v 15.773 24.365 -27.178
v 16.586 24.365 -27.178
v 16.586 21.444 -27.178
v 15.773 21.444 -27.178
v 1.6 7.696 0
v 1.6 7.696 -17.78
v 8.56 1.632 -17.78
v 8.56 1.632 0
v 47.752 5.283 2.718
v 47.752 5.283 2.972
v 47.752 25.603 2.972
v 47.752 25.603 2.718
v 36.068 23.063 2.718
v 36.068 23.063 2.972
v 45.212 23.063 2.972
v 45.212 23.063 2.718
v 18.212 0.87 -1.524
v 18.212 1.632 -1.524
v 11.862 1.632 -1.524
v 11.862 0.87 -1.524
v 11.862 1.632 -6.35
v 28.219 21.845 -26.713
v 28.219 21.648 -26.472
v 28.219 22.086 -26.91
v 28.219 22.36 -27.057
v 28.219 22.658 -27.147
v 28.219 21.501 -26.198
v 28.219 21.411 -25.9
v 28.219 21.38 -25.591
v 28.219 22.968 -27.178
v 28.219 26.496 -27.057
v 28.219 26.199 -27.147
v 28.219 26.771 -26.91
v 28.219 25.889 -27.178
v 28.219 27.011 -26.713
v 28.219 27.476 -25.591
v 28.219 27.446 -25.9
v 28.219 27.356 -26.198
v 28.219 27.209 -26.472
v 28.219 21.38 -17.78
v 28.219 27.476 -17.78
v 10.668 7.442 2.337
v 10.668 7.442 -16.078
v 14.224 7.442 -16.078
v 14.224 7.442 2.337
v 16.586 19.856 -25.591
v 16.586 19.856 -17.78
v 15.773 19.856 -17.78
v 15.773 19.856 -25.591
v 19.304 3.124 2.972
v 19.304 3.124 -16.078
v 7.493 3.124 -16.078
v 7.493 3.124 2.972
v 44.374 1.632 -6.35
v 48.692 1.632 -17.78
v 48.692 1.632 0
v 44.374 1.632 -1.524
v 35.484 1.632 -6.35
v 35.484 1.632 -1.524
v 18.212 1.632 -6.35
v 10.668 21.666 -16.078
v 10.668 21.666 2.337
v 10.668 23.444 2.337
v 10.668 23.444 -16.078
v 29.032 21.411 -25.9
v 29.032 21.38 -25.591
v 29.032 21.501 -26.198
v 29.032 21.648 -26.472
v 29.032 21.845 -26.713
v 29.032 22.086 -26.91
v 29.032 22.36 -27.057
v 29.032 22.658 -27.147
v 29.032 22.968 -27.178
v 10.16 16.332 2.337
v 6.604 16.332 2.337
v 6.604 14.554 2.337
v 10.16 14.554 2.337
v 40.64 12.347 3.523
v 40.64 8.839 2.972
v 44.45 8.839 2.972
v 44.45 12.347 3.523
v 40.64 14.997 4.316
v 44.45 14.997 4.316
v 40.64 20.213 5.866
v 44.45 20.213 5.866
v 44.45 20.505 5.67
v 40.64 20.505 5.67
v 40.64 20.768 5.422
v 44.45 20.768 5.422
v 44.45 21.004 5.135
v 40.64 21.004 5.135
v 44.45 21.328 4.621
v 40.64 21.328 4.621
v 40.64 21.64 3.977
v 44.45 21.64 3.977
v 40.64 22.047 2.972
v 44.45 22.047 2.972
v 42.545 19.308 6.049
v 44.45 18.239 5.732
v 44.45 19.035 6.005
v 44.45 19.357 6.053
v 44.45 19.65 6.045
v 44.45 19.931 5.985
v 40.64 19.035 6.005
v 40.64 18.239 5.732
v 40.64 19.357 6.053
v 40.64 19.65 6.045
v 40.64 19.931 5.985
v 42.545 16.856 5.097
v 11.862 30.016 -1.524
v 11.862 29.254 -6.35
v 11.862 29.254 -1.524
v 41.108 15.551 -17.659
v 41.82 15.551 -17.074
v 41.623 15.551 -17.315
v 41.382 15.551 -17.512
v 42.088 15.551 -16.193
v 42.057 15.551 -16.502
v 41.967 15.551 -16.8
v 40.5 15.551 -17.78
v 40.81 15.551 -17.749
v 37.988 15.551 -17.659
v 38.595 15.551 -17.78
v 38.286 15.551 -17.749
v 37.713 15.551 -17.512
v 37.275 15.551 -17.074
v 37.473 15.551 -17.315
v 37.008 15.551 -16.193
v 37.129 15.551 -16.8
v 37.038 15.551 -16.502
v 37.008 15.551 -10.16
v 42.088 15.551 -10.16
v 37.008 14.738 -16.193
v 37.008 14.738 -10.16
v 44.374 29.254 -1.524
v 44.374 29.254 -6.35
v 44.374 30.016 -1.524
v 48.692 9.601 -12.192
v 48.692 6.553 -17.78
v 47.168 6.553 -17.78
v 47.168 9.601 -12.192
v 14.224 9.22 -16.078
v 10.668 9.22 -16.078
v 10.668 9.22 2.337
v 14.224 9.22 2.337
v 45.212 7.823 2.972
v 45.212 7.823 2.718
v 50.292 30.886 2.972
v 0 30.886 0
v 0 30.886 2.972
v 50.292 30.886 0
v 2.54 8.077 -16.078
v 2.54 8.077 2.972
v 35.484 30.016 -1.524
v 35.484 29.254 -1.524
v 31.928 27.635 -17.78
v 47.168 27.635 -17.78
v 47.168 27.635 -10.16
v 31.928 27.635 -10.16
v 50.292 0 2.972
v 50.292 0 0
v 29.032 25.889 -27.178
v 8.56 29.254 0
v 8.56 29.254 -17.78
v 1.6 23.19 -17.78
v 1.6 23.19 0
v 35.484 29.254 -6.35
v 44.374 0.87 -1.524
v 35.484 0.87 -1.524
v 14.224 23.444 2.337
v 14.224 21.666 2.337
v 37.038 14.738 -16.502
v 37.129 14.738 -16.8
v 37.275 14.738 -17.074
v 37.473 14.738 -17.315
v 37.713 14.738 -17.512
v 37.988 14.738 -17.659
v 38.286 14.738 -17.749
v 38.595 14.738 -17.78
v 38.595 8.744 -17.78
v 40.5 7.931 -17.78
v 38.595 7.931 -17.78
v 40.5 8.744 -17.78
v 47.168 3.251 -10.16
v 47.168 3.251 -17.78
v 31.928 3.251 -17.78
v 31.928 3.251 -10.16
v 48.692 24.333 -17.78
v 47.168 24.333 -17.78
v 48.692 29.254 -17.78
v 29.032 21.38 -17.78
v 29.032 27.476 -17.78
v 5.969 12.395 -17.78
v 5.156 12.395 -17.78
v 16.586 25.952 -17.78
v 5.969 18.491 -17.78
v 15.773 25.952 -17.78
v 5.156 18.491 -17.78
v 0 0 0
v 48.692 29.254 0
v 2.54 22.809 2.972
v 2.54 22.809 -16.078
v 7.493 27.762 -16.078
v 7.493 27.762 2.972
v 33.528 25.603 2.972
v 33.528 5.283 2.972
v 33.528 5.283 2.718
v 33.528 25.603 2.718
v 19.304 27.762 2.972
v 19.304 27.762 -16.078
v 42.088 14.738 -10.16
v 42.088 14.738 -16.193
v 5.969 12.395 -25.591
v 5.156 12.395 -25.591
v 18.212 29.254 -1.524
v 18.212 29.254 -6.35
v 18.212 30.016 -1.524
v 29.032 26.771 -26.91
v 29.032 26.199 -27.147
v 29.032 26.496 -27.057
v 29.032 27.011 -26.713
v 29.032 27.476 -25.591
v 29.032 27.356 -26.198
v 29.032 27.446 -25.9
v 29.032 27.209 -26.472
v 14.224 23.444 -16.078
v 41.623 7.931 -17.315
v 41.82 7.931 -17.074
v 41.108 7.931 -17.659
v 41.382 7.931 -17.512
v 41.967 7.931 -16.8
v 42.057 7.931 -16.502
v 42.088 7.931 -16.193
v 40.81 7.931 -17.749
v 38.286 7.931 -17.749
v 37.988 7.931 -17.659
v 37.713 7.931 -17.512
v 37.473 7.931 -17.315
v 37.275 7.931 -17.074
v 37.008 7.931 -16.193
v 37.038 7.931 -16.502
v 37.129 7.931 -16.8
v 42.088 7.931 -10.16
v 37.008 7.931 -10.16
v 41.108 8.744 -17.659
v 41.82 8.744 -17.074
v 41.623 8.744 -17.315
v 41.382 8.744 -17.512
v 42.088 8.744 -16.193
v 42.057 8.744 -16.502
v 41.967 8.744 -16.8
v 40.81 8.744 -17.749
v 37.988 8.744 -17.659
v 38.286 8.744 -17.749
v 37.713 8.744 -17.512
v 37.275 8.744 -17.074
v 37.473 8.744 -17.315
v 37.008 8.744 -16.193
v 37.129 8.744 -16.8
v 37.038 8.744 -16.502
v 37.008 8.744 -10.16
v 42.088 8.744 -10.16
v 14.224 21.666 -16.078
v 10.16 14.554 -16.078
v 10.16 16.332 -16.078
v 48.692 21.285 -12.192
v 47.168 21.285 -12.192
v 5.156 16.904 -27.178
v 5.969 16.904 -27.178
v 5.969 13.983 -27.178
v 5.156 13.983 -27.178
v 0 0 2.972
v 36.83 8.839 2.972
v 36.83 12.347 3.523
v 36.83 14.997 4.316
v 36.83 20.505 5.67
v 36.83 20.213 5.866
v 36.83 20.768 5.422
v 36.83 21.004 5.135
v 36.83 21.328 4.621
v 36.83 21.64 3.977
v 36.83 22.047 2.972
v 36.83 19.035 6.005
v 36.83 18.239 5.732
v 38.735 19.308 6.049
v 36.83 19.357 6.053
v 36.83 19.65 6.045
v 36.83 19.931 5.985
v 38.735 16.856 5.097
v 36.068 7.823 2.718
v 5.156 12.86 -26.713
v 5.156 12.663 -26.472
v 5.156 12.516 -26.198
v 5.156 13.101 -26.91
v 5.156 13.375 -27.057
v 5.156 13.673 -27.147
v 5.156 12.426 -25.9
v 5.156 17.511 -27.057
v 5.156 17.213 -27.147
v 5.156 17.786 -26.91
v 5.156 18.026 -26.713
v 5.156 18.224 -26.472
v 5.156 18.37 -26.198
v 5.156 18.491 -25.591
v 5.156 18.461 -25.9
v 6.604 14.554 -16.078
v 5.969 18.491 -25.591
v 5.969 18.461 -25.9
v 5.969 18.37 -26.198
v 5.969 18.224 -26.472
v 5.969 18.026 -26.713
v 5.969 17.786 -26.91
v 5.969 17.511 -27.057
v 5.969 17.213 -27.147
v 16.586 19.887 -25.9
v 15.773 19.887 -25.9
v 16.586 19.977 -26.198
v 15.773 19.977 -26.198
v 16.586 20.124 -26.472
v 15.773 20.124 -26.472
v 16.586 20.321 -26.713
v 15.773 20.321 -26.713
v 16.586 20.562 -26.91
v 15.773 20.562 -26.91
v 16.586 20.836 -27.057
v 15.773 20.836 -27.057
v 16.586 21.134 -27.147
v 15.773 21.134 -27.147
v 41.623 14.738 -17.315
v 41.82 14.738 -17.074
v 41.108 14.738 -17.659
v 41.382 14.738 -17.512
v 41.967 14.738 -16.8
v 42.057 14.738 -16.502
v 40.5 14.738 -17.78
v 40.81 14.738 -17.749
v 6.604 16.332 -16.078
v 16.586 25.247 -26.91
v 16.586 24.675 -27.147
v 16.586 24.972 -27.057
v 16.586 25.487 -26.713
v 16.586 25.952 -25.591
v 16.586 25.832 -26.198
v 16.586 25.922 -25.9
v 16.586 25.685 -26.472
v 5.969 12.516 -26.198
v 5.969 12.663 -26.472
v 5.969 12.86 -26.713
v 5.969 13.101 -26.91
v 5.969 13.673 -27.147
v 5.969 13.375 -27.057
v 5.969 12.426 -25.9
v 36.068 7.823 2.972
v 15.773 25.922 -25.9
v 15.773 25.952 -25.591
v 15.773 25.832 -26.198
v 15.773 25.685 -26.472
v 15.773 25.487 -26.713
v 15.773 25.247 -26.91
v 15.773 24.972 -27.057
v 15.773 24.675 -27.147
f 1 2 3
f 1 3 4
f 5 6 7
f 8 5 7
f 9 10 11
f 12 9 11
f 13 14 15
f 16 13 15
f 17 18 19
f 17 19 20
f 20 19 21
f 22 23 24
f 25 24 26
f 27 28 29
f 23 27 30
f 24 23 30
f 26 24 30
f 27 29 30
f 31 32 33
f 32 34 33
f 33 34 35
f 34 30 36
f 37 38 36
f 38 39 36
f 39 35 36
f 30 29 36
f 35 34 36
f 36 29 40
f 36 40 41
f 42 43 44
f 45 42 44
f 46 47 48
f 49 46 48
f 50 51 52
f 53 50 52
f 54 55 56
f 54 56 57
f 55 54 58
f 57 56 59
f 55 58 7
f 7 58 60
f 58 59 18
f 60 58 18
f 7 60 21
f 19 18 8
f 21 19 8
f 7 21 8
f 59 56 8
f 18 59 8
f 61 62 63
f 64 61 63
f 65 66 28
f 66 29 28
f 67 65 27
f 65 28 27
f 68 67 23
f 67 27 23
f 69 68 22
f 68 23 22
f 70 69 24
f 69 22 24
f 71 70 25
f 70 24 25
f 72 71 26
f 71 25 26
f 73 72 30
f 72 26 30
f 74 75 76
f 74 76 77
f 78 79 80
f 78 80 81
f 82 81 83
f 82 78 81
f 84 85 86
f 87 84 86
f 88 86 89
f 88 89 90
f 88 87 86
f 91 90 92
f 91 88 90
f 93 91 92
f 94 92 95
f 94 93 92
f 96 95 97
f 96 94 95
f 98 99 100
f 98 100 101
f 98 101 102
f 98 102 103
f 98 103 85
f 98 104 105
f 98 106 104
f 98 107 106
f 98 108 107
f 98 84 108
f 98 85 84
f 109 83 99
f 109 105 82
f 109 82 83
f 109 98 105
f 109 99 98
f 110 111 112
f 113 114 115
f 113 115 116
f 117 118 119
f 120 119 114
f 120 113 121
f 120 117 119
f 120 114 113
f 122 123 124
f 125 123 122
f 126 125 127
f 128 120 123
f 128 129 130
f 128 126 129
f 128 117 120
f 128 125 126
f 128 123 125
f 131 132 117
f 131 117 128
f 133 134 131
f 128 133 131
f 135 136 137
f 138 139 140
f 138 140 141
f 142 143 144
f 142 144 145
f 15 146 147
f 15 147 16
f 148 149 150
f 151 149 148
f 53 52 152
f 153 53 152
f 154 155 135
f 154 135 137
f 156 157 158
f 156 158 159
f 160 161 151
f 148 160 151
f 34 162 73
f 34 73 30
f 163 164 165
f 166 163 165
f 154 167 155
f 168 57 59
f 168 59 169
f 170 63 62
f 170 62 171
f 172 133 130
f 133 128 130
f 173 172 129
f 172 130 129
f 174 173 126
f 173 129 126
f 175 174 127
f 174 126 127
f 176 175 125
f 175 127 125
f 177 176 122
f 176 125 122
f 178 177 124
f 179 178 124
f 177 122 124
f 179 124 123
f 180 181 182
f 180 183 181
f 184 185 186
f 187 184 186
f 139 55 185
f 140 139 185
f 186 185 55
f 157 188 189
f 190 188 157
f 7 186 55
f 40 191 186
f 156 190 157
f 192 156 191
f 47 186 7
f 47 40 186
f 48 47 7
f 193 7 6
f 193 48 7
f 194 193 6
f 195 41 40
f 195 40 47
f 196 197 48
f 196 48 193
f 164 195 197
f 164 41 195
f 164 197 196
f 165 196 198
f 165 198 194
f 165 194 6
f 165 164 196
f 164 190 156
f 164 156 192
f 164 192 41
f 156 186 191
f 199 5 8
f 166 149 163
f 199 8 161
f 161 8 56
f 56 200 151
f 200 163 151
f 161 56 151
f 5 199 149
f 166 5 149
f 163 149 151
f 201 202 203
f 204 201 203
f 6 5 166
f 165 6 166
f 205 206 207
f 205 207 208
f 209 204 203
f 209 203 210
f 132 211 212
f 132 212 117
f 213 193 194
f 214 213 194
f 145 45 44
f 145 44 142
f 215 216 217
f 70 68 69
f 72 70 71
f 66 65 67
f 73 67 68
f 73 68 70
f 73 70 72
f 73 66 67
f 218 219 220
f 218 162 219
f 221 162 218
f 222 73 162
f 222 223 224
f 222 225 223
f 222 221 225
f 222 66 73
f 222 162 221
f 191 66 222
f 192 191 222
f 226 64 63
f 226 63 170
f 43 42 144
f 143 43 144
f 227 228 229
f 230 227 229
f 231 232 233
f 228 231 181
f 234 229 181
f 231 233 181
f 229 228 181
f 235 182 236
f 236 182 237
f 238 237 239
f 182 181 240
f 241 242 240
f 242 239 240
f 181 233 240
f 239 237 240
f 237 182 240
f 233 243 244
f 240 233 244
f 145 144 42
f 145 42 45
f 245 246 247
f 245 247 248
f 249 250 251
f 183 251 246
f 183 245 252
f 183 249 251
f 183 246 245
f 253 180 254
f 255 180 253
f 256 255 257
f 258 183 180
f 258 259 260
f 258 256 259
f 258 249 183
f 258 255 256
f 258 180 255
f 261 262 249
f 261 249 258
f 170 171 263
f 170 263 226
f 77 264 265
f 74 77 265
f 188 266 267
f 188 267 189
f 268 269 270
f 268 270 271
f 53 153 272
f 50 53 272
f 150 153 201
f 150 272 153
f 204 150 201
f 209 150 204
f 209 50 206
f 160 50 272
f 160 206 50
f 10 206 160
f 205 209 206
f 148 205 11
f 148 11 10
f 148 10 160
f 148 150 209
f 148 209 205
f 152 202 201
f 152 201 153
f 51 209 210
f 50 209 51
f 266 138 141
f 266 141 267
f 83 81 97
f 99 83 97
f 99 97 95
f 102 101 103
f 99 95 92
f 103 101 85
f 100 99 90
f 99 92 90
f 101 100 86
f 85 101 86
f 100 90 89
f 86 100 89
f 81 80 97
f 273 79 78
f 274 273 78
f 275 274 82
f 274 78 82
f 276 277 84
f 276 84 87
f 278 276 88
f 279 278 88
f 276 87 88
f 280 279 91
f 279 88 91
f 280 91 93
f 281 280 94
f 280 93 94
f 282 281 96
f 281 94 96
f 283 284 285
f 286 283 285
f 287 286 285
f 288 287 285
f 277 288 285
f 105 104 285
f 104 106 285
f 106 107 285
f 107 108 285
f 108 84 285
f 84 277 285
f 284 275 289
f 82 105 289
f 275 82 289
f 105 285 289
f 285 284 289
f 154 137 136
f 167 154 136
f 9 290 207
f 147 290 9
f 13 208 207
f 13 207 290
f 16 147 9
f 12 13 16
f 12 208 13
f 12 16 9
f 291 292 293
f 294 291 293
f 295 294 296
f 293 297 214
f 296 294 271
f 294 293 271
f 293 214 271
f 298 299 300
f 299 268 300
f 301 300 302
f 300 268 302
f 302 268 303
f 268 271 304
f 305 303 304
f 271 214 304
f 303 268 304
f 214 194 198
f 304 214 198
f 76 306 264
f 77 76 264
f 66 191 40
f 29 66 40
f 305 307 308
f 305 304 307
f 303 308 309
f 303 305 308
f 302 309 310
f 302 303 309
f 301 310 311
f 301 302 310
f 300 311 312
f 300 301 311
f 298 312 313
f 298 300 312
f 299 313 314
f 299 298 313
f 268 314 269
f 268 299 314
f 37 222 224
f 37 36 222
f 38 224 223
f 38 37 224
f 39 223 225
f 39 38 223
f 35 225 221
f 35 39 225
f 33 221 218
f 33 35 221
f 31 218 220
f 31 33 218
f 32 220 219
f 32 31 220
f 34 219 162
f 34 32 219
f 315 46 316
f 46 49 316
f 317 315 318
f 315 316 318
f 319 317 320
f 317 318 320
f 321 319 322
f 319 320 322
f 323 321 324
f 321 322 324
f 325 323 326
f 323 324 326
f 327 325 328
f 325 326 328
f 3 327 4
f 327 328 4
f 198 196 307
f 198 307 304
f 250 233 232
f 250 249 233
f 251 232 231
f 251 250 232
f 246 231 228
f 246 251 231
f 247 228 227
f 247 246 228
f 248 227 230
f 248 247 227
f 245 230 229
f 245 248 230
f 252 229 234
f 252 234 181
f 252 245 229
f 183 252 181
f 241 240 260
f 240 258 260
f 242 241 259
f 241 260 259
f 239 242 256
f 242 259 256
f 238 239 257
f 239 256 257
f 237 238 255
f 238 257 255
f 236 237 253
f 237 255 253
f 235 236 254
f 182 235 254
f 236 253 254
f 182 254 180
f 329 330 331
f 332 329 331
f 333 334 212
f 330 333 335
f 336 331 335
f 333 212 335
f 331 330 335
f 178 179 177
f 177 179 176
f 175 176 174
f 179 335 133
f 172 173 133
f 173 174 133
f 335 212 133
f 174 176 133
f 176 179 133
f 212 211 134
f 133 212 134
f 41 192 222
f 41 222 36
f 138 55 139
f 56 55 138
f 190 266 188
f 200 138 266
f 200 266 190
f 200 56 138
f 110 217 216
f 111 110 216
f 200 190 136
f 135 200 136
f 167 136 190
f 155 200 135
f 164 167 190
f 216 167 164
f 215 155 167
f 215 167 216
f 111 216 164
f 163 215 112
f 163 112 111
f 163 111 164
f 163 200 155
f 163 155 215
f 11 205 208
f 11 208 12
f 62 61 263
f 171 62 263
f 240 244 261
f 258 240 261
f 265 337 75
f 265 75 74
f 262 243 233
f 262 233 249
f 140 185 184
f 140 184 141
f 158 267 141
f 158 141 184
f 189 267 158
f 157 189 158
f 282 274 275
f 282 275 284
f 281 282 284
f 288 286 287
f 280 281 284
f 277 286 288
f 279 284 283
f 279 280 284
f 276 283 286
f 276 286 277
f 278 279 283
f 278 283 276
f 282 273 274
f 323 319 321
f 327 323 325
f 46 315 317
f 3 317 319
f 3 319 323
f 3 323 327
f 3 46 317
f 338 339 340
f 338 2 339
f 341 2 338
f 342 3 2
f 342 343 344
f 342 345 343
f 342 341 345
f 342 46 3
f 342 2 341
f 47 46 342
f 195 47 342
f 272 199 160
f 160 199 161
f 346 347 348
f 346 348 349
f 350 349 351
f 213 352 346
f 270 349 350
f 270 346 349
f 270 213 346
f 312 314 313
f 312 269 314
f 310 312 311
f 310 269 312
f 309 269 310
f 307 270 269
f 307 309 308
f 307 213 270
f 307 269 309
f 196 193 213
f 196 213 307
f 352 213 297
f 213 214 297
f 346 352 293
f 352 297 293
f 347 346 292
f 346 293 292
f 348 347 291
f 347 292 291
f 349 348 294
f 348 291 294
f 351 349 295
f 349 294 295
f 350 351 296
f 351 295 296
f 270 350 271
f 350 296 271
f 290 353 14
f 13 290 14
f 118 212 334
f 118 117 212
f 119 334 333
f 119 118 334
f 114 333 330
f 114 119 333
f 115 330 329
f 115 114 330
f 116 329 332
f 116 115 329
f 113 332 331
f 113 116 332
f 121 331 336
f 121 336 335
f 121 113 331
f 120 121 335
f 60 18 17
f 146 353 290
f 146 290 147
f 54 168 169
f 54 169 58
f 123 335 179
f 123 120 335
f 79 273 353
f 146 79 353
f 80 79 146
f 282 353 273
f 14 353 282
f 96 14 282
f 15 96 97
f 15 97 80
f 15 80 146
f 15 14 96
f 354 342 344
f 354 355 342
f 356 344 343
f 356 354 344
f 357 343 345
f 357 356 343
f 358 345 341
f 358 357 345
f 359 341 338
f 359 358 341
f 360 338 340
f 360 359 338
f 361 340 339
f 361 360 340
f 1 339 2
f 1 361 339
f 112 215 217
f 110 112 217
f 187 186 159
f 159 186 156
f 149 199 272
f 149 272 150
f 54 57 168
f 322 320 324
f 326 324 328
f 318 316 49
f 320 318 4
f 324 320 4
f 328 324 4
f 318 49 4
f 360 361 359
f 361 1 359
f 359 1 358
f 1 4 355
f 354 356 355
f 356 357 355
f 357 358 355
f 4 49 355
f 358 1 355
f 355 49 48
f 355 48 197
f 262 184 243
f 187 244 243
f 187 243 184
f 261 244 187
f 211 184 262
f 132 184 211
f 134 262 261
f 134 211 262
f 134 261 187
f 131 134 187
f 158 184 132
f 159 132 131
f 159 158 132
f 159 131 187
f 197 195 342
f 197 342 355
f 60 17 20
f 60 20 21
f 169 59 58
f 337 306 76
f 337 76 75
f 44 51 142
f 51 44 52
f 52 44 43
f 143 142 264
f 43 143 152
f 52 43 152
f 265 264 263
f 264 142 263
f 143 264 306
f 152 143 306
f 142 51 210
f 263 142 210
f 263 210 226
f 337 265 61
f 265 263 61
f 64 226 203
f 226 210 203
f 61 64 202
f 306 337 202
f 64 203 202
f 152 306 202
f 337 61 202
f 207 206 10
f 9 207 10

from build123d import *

# Parameters (mm, degrees)
SKETCH1_W           = 50.292
SKETCH1_H           = 30.8864
BOSS_EXTRUDE1_DEPTH = 2.9718
SKETCH2_W           = 47.0916
SKETCH2_H           = 27.6225
BOSS_EXTRUDE2_DEPTH = 17.78
CUT_EXTRUDE1_DEPTH  = 17.78
SKETCH4_W           = 15.24
SKETCH4_H           = 24.384
CUT_EXTRUDE2_DEPTH  = 7.62
CUT_EXTRUDE3_REACH  = 62.341
SKETCH6_W           = 0.8128
SKETCH6_H           = 6.096
BOSS_EXTRUDE3_DEPTH = 9.398
SKETCH7_W           = 5.08
SKETCH7_H           = 0.8128
BOSS_EXTRUDE4_DEPTH = 7.62
FILLET1_R           = 1.5875
CUT_EXTRUDE4_DEPTH  = 19.05
SKETCH9_W           = 3.556
SKETCH9_H           = 1.778
BOSS_EXTRUDE5_DEPTH = 18.415
SKETCH10_W          = 14.224
SKETCH10_H          = 20.32
SKETCH10_W_2        = 9.144
SKETCH10_H_2        = 15.24
CUT_EXTRUDE5_DEPTH  = 0.254
BOSS_EXTRUDE6_START = -9.652
BOSS_EXTRUDE6_DEPTH = 3.81
BOSS_EXTRUDE7_START = -4.318
BOSS_EXTRUDE7_DEPTH = 8.89
BOSS_EXTRUDE8_START = -30.48
BOSS_EXTRUDE8_DEPTH = 6.35


with BuildPart() as part:
    # Sketch1 → Boss-Extrude1 (new body)
    with BuildSketch(Plane.XY):
        with Locations((25.146, 15.4432)):
            Rectangle(SKETCH1_W, SKETCH1_H)
    extrude(amount=BOSS_EXTRUDE1_DEPTH)

    # Sketch2 → Boss-Extrude2 (add)
    with BuildSketch(Plane(origin=(0, 0, 0), x_dir=(-1, 0, 0), z_dir=(0, 0, -1))):
        with Locations((-25.146, 15.4432)):
            Rectangle(SKETCH2_W, SKETCH2_H)
    extrude(amount=BOSS_EXTRUDE2_DEPTH)

    # Sketch3 → Cut-Extrude1 (cut)
    with BuildSketch(Plane(origin=(0, 0, -17.78), x_dir=(-1, 0, 0), z_dir=(0, 0, -1))):
        Polygon((-8.5598, 29.25445), (-1.6002, 23.1902), (-1.6002, 29.25445), align=None)
        Polygon((-1.6002, 1.63195), (-1.6002, 7.6962), (-8.5598, 1.63195), align=None)
    extrude(amount=-CUT_EXTRUDE1_DEPTH, mode=Mode.SUBTRACT)

    # Sketch4 → Cut-Extrude2 (cut)
    with BuildSketch(Plane(origin=(0, 0, -17.78), x_dir=(-1, 0, 0), z_dir=(0, 0, -1))):
        with Locations((-39.5478, 15.4432)):
            Rectangle(SKETCH4_W, SKETCH4_H)
    extrude(amount=-CUT_EXTRUDE2_DEPTH, mode=Mode.SUBTRACT)

    # Sketch5 → Cut-Extrude3 (cut, up to next)
    with BuildSketch(Plane(origin=(48.6918, 0, 0), x_dir=(0, 0, -1), z_dir=(1, 0, 0)), mode=Mode.PRIVATE) as cut_extrude3_sk1:
        Polygon((17.78, 24.3332), (17.78, 6.5532), (12.192, 9.6012), (12.192, 21.2852), align=None)
    cut_extrude3_tool1 = extrude(cut_extrude3_sk1.sketch, amount=-CUT_EXTRUDE3_REACH, mode=Mode.PRIVATE) & part.part
    add(cut_extrude3_tool1.solids().sort_by_distance((48.6918, 15.4432, -15.17869))[0], mode=Mode.SUBTRACT)

    # Sketch6 → Boss-Extrude3 (add)
    with BuildSketch(Plane(origin=(0, 0, -17.78), x_dir=(-1, 0, 0), z_dir=(0, 0, -1))):
        with Locations((-5.5626, 15.4432)):
            Rectangle(SKETCH6_W, SKETCH6_H)
        with Locations((-16.1798, 22.90445)):
            Rectangle(SKETCH6_W, SKETCH6_H)
        with Locations((-28.6258, 24.42845)):
            Rectangle(SKETCH6_W, SKETCH6_H)
    extrude(amount=BOSS_EXTRUDE3_DEPTH)

    # Sketch7 → Boss-Extrude4 (add)
    with BuildSketch(Plane(origin=(0, 0, -10.16), x_dir=(-1, 0, 0), z_dir=(0, 0, -1))):
        with Locations((-39.5478, 8.33755)):
            Rectangle(SKETCH7_W, SKETCH7_H)
        with Locations((-39.5478, 15.14475)):
            Rectangle(SKETCH7_W, SKETCH7_H)
    extrude(amount=BOSS_EXTRUDE4_DEPTH)

    # Fillet1
    fillet1_edges = [part.edges().sort_by_distance(p)[0] for p in [
        (42.0878, 8.33755, -17.78),
        (37.0078, 8.33755, -17.78),
        (42.0878, 15.14475, -17.78),
        (37.0078, 15.14475, -17.78),
        (5.5626, 12.3952, -27.178),
        (5.5626, 18.4912, -27.178),
        (16.1798, 19.85645, -27.178),
        (16.1798, 25.95245, -27.178),
        (28.6258, 21.38045, -27.178),
        (28.6258, 27.47645, -27.178),
    ]]
    fillet(fillet1_edges, radius=FILLET1_R)

    # Sketch8 → Cut-Extrude4 (cut)
    with BuildSketch(Plane.XY.offset(2.9718)):
        Polygon((19.304, 27.7622), (19.304, 3.1242), (7.493, 3.1242), (2.54, 8.0772), (2.54, 15.4432), (2.54, 22.8092), (7.493, 27.7622), align=None)
    extrude(amount=-CUT_EXTRUDE4_DEPTH, mode=Mode.SUBTRACT)

    # Sketch9 → Boss-Extrude5 (add)
    with BuildSketch(Plane.XY.offset(-16.0782)):
        with Locations((12.446, 22.5552)):
            Rectangle(SKETCH9_W, SKETCH9_H)
        with Locations((8.382, 15.4432)):
            Rectangle(SKETCH9_W, SKETCH9_H)
        with Locations((12.446, 8.3312)):
            Rectangle(SKETCH9_W, SKETCH9_H)
    extrude(amount=BOSS_EXTRUDE5_DEPTH)

    # Sketch10 → Cut-Extrude5 (cut)
    with BuildSketch(Plane.XY.offset(2.9718)):
        with Locations((40.64, 15.4432)):
            Rectangle(SKETCH10_W, SKETCH10_H)
        with Locations((40.64, 15.4432)):
            Rectangle(SKETCH10_W_2, SKETCH10_H_2, mode=Mode.SUBTRACT)
    extrude(amount=-CUT_EXTRUDE5_DEPTH, mode=Mode.SUBTRACT)

    # Sketch11 → Boss-Extrude6 (add, symmetric)
    with BuildSketch(Plane(origin=(50.292, 0, 0), x_dir=(0, 0, -1), z_dir=(1, 0, 0)).offset(BOSS_EXTRUDE6_START)):
        with BuildLine():
            Line((-2.9718, 15.4432), (-2.9718, 22.0472))
            add(Edge.make_bspline(
                [(-2.9718, 8.8392), (-3.553872131, 15.290477118), (-8.392581533, 20.316911693), (-3.884219092, 21.66276478), (-2.9718, 22.0472)],
                knots=[0, 0, 0, 0, 0.486211791, 1, 1, 1, 1], degree=3))
            Line((-2.9718, 8.8392), (-2.9718, 15.4432))
        make_face()
    extrude(amount=BOSS_EXTRUDE6_DEPTH, both=True)

    # Sketch12 → Boss-Extrude7 (add)
    with BuildSketch(Plane(origin=(48.6918, 0, 0), x_dir=(0, 0, -1), z_dir=(1, 0, 0)).offset(BOSS_EXTRUDE7_START)):
        Polygon((1.524, 29.25445), (1.524, 30.01645), (6.35, 29.25445), align=None)
        Polygon((1.524, 1.63195), (1.524, 0.86995), (6.35, 1.63195), align=None)
    extrude(amount=-BOSS_EXTRUDE7_DEPTH)

    # Sketch12<2> → Boss-Extrude8 (add)
    with BuildSketch(Plane(origin=(48.6918, 0, 0), x_dir=(0, 0, -1), z_dir=(1, 0, 0)).offset(BOSS_EXTRUDE8_START)):
        Polygon((1.524, 29.25445), (1.524, 30.01645), (6.35, 29.25445), align=None)
        Polygon((1.524, 1.63195), (1.524, 0.86995), (6.35, 1.63195), align=None)
    extrude(amount=-BOSS_EXTRUDE8_DEPTH)


solid = part.part
